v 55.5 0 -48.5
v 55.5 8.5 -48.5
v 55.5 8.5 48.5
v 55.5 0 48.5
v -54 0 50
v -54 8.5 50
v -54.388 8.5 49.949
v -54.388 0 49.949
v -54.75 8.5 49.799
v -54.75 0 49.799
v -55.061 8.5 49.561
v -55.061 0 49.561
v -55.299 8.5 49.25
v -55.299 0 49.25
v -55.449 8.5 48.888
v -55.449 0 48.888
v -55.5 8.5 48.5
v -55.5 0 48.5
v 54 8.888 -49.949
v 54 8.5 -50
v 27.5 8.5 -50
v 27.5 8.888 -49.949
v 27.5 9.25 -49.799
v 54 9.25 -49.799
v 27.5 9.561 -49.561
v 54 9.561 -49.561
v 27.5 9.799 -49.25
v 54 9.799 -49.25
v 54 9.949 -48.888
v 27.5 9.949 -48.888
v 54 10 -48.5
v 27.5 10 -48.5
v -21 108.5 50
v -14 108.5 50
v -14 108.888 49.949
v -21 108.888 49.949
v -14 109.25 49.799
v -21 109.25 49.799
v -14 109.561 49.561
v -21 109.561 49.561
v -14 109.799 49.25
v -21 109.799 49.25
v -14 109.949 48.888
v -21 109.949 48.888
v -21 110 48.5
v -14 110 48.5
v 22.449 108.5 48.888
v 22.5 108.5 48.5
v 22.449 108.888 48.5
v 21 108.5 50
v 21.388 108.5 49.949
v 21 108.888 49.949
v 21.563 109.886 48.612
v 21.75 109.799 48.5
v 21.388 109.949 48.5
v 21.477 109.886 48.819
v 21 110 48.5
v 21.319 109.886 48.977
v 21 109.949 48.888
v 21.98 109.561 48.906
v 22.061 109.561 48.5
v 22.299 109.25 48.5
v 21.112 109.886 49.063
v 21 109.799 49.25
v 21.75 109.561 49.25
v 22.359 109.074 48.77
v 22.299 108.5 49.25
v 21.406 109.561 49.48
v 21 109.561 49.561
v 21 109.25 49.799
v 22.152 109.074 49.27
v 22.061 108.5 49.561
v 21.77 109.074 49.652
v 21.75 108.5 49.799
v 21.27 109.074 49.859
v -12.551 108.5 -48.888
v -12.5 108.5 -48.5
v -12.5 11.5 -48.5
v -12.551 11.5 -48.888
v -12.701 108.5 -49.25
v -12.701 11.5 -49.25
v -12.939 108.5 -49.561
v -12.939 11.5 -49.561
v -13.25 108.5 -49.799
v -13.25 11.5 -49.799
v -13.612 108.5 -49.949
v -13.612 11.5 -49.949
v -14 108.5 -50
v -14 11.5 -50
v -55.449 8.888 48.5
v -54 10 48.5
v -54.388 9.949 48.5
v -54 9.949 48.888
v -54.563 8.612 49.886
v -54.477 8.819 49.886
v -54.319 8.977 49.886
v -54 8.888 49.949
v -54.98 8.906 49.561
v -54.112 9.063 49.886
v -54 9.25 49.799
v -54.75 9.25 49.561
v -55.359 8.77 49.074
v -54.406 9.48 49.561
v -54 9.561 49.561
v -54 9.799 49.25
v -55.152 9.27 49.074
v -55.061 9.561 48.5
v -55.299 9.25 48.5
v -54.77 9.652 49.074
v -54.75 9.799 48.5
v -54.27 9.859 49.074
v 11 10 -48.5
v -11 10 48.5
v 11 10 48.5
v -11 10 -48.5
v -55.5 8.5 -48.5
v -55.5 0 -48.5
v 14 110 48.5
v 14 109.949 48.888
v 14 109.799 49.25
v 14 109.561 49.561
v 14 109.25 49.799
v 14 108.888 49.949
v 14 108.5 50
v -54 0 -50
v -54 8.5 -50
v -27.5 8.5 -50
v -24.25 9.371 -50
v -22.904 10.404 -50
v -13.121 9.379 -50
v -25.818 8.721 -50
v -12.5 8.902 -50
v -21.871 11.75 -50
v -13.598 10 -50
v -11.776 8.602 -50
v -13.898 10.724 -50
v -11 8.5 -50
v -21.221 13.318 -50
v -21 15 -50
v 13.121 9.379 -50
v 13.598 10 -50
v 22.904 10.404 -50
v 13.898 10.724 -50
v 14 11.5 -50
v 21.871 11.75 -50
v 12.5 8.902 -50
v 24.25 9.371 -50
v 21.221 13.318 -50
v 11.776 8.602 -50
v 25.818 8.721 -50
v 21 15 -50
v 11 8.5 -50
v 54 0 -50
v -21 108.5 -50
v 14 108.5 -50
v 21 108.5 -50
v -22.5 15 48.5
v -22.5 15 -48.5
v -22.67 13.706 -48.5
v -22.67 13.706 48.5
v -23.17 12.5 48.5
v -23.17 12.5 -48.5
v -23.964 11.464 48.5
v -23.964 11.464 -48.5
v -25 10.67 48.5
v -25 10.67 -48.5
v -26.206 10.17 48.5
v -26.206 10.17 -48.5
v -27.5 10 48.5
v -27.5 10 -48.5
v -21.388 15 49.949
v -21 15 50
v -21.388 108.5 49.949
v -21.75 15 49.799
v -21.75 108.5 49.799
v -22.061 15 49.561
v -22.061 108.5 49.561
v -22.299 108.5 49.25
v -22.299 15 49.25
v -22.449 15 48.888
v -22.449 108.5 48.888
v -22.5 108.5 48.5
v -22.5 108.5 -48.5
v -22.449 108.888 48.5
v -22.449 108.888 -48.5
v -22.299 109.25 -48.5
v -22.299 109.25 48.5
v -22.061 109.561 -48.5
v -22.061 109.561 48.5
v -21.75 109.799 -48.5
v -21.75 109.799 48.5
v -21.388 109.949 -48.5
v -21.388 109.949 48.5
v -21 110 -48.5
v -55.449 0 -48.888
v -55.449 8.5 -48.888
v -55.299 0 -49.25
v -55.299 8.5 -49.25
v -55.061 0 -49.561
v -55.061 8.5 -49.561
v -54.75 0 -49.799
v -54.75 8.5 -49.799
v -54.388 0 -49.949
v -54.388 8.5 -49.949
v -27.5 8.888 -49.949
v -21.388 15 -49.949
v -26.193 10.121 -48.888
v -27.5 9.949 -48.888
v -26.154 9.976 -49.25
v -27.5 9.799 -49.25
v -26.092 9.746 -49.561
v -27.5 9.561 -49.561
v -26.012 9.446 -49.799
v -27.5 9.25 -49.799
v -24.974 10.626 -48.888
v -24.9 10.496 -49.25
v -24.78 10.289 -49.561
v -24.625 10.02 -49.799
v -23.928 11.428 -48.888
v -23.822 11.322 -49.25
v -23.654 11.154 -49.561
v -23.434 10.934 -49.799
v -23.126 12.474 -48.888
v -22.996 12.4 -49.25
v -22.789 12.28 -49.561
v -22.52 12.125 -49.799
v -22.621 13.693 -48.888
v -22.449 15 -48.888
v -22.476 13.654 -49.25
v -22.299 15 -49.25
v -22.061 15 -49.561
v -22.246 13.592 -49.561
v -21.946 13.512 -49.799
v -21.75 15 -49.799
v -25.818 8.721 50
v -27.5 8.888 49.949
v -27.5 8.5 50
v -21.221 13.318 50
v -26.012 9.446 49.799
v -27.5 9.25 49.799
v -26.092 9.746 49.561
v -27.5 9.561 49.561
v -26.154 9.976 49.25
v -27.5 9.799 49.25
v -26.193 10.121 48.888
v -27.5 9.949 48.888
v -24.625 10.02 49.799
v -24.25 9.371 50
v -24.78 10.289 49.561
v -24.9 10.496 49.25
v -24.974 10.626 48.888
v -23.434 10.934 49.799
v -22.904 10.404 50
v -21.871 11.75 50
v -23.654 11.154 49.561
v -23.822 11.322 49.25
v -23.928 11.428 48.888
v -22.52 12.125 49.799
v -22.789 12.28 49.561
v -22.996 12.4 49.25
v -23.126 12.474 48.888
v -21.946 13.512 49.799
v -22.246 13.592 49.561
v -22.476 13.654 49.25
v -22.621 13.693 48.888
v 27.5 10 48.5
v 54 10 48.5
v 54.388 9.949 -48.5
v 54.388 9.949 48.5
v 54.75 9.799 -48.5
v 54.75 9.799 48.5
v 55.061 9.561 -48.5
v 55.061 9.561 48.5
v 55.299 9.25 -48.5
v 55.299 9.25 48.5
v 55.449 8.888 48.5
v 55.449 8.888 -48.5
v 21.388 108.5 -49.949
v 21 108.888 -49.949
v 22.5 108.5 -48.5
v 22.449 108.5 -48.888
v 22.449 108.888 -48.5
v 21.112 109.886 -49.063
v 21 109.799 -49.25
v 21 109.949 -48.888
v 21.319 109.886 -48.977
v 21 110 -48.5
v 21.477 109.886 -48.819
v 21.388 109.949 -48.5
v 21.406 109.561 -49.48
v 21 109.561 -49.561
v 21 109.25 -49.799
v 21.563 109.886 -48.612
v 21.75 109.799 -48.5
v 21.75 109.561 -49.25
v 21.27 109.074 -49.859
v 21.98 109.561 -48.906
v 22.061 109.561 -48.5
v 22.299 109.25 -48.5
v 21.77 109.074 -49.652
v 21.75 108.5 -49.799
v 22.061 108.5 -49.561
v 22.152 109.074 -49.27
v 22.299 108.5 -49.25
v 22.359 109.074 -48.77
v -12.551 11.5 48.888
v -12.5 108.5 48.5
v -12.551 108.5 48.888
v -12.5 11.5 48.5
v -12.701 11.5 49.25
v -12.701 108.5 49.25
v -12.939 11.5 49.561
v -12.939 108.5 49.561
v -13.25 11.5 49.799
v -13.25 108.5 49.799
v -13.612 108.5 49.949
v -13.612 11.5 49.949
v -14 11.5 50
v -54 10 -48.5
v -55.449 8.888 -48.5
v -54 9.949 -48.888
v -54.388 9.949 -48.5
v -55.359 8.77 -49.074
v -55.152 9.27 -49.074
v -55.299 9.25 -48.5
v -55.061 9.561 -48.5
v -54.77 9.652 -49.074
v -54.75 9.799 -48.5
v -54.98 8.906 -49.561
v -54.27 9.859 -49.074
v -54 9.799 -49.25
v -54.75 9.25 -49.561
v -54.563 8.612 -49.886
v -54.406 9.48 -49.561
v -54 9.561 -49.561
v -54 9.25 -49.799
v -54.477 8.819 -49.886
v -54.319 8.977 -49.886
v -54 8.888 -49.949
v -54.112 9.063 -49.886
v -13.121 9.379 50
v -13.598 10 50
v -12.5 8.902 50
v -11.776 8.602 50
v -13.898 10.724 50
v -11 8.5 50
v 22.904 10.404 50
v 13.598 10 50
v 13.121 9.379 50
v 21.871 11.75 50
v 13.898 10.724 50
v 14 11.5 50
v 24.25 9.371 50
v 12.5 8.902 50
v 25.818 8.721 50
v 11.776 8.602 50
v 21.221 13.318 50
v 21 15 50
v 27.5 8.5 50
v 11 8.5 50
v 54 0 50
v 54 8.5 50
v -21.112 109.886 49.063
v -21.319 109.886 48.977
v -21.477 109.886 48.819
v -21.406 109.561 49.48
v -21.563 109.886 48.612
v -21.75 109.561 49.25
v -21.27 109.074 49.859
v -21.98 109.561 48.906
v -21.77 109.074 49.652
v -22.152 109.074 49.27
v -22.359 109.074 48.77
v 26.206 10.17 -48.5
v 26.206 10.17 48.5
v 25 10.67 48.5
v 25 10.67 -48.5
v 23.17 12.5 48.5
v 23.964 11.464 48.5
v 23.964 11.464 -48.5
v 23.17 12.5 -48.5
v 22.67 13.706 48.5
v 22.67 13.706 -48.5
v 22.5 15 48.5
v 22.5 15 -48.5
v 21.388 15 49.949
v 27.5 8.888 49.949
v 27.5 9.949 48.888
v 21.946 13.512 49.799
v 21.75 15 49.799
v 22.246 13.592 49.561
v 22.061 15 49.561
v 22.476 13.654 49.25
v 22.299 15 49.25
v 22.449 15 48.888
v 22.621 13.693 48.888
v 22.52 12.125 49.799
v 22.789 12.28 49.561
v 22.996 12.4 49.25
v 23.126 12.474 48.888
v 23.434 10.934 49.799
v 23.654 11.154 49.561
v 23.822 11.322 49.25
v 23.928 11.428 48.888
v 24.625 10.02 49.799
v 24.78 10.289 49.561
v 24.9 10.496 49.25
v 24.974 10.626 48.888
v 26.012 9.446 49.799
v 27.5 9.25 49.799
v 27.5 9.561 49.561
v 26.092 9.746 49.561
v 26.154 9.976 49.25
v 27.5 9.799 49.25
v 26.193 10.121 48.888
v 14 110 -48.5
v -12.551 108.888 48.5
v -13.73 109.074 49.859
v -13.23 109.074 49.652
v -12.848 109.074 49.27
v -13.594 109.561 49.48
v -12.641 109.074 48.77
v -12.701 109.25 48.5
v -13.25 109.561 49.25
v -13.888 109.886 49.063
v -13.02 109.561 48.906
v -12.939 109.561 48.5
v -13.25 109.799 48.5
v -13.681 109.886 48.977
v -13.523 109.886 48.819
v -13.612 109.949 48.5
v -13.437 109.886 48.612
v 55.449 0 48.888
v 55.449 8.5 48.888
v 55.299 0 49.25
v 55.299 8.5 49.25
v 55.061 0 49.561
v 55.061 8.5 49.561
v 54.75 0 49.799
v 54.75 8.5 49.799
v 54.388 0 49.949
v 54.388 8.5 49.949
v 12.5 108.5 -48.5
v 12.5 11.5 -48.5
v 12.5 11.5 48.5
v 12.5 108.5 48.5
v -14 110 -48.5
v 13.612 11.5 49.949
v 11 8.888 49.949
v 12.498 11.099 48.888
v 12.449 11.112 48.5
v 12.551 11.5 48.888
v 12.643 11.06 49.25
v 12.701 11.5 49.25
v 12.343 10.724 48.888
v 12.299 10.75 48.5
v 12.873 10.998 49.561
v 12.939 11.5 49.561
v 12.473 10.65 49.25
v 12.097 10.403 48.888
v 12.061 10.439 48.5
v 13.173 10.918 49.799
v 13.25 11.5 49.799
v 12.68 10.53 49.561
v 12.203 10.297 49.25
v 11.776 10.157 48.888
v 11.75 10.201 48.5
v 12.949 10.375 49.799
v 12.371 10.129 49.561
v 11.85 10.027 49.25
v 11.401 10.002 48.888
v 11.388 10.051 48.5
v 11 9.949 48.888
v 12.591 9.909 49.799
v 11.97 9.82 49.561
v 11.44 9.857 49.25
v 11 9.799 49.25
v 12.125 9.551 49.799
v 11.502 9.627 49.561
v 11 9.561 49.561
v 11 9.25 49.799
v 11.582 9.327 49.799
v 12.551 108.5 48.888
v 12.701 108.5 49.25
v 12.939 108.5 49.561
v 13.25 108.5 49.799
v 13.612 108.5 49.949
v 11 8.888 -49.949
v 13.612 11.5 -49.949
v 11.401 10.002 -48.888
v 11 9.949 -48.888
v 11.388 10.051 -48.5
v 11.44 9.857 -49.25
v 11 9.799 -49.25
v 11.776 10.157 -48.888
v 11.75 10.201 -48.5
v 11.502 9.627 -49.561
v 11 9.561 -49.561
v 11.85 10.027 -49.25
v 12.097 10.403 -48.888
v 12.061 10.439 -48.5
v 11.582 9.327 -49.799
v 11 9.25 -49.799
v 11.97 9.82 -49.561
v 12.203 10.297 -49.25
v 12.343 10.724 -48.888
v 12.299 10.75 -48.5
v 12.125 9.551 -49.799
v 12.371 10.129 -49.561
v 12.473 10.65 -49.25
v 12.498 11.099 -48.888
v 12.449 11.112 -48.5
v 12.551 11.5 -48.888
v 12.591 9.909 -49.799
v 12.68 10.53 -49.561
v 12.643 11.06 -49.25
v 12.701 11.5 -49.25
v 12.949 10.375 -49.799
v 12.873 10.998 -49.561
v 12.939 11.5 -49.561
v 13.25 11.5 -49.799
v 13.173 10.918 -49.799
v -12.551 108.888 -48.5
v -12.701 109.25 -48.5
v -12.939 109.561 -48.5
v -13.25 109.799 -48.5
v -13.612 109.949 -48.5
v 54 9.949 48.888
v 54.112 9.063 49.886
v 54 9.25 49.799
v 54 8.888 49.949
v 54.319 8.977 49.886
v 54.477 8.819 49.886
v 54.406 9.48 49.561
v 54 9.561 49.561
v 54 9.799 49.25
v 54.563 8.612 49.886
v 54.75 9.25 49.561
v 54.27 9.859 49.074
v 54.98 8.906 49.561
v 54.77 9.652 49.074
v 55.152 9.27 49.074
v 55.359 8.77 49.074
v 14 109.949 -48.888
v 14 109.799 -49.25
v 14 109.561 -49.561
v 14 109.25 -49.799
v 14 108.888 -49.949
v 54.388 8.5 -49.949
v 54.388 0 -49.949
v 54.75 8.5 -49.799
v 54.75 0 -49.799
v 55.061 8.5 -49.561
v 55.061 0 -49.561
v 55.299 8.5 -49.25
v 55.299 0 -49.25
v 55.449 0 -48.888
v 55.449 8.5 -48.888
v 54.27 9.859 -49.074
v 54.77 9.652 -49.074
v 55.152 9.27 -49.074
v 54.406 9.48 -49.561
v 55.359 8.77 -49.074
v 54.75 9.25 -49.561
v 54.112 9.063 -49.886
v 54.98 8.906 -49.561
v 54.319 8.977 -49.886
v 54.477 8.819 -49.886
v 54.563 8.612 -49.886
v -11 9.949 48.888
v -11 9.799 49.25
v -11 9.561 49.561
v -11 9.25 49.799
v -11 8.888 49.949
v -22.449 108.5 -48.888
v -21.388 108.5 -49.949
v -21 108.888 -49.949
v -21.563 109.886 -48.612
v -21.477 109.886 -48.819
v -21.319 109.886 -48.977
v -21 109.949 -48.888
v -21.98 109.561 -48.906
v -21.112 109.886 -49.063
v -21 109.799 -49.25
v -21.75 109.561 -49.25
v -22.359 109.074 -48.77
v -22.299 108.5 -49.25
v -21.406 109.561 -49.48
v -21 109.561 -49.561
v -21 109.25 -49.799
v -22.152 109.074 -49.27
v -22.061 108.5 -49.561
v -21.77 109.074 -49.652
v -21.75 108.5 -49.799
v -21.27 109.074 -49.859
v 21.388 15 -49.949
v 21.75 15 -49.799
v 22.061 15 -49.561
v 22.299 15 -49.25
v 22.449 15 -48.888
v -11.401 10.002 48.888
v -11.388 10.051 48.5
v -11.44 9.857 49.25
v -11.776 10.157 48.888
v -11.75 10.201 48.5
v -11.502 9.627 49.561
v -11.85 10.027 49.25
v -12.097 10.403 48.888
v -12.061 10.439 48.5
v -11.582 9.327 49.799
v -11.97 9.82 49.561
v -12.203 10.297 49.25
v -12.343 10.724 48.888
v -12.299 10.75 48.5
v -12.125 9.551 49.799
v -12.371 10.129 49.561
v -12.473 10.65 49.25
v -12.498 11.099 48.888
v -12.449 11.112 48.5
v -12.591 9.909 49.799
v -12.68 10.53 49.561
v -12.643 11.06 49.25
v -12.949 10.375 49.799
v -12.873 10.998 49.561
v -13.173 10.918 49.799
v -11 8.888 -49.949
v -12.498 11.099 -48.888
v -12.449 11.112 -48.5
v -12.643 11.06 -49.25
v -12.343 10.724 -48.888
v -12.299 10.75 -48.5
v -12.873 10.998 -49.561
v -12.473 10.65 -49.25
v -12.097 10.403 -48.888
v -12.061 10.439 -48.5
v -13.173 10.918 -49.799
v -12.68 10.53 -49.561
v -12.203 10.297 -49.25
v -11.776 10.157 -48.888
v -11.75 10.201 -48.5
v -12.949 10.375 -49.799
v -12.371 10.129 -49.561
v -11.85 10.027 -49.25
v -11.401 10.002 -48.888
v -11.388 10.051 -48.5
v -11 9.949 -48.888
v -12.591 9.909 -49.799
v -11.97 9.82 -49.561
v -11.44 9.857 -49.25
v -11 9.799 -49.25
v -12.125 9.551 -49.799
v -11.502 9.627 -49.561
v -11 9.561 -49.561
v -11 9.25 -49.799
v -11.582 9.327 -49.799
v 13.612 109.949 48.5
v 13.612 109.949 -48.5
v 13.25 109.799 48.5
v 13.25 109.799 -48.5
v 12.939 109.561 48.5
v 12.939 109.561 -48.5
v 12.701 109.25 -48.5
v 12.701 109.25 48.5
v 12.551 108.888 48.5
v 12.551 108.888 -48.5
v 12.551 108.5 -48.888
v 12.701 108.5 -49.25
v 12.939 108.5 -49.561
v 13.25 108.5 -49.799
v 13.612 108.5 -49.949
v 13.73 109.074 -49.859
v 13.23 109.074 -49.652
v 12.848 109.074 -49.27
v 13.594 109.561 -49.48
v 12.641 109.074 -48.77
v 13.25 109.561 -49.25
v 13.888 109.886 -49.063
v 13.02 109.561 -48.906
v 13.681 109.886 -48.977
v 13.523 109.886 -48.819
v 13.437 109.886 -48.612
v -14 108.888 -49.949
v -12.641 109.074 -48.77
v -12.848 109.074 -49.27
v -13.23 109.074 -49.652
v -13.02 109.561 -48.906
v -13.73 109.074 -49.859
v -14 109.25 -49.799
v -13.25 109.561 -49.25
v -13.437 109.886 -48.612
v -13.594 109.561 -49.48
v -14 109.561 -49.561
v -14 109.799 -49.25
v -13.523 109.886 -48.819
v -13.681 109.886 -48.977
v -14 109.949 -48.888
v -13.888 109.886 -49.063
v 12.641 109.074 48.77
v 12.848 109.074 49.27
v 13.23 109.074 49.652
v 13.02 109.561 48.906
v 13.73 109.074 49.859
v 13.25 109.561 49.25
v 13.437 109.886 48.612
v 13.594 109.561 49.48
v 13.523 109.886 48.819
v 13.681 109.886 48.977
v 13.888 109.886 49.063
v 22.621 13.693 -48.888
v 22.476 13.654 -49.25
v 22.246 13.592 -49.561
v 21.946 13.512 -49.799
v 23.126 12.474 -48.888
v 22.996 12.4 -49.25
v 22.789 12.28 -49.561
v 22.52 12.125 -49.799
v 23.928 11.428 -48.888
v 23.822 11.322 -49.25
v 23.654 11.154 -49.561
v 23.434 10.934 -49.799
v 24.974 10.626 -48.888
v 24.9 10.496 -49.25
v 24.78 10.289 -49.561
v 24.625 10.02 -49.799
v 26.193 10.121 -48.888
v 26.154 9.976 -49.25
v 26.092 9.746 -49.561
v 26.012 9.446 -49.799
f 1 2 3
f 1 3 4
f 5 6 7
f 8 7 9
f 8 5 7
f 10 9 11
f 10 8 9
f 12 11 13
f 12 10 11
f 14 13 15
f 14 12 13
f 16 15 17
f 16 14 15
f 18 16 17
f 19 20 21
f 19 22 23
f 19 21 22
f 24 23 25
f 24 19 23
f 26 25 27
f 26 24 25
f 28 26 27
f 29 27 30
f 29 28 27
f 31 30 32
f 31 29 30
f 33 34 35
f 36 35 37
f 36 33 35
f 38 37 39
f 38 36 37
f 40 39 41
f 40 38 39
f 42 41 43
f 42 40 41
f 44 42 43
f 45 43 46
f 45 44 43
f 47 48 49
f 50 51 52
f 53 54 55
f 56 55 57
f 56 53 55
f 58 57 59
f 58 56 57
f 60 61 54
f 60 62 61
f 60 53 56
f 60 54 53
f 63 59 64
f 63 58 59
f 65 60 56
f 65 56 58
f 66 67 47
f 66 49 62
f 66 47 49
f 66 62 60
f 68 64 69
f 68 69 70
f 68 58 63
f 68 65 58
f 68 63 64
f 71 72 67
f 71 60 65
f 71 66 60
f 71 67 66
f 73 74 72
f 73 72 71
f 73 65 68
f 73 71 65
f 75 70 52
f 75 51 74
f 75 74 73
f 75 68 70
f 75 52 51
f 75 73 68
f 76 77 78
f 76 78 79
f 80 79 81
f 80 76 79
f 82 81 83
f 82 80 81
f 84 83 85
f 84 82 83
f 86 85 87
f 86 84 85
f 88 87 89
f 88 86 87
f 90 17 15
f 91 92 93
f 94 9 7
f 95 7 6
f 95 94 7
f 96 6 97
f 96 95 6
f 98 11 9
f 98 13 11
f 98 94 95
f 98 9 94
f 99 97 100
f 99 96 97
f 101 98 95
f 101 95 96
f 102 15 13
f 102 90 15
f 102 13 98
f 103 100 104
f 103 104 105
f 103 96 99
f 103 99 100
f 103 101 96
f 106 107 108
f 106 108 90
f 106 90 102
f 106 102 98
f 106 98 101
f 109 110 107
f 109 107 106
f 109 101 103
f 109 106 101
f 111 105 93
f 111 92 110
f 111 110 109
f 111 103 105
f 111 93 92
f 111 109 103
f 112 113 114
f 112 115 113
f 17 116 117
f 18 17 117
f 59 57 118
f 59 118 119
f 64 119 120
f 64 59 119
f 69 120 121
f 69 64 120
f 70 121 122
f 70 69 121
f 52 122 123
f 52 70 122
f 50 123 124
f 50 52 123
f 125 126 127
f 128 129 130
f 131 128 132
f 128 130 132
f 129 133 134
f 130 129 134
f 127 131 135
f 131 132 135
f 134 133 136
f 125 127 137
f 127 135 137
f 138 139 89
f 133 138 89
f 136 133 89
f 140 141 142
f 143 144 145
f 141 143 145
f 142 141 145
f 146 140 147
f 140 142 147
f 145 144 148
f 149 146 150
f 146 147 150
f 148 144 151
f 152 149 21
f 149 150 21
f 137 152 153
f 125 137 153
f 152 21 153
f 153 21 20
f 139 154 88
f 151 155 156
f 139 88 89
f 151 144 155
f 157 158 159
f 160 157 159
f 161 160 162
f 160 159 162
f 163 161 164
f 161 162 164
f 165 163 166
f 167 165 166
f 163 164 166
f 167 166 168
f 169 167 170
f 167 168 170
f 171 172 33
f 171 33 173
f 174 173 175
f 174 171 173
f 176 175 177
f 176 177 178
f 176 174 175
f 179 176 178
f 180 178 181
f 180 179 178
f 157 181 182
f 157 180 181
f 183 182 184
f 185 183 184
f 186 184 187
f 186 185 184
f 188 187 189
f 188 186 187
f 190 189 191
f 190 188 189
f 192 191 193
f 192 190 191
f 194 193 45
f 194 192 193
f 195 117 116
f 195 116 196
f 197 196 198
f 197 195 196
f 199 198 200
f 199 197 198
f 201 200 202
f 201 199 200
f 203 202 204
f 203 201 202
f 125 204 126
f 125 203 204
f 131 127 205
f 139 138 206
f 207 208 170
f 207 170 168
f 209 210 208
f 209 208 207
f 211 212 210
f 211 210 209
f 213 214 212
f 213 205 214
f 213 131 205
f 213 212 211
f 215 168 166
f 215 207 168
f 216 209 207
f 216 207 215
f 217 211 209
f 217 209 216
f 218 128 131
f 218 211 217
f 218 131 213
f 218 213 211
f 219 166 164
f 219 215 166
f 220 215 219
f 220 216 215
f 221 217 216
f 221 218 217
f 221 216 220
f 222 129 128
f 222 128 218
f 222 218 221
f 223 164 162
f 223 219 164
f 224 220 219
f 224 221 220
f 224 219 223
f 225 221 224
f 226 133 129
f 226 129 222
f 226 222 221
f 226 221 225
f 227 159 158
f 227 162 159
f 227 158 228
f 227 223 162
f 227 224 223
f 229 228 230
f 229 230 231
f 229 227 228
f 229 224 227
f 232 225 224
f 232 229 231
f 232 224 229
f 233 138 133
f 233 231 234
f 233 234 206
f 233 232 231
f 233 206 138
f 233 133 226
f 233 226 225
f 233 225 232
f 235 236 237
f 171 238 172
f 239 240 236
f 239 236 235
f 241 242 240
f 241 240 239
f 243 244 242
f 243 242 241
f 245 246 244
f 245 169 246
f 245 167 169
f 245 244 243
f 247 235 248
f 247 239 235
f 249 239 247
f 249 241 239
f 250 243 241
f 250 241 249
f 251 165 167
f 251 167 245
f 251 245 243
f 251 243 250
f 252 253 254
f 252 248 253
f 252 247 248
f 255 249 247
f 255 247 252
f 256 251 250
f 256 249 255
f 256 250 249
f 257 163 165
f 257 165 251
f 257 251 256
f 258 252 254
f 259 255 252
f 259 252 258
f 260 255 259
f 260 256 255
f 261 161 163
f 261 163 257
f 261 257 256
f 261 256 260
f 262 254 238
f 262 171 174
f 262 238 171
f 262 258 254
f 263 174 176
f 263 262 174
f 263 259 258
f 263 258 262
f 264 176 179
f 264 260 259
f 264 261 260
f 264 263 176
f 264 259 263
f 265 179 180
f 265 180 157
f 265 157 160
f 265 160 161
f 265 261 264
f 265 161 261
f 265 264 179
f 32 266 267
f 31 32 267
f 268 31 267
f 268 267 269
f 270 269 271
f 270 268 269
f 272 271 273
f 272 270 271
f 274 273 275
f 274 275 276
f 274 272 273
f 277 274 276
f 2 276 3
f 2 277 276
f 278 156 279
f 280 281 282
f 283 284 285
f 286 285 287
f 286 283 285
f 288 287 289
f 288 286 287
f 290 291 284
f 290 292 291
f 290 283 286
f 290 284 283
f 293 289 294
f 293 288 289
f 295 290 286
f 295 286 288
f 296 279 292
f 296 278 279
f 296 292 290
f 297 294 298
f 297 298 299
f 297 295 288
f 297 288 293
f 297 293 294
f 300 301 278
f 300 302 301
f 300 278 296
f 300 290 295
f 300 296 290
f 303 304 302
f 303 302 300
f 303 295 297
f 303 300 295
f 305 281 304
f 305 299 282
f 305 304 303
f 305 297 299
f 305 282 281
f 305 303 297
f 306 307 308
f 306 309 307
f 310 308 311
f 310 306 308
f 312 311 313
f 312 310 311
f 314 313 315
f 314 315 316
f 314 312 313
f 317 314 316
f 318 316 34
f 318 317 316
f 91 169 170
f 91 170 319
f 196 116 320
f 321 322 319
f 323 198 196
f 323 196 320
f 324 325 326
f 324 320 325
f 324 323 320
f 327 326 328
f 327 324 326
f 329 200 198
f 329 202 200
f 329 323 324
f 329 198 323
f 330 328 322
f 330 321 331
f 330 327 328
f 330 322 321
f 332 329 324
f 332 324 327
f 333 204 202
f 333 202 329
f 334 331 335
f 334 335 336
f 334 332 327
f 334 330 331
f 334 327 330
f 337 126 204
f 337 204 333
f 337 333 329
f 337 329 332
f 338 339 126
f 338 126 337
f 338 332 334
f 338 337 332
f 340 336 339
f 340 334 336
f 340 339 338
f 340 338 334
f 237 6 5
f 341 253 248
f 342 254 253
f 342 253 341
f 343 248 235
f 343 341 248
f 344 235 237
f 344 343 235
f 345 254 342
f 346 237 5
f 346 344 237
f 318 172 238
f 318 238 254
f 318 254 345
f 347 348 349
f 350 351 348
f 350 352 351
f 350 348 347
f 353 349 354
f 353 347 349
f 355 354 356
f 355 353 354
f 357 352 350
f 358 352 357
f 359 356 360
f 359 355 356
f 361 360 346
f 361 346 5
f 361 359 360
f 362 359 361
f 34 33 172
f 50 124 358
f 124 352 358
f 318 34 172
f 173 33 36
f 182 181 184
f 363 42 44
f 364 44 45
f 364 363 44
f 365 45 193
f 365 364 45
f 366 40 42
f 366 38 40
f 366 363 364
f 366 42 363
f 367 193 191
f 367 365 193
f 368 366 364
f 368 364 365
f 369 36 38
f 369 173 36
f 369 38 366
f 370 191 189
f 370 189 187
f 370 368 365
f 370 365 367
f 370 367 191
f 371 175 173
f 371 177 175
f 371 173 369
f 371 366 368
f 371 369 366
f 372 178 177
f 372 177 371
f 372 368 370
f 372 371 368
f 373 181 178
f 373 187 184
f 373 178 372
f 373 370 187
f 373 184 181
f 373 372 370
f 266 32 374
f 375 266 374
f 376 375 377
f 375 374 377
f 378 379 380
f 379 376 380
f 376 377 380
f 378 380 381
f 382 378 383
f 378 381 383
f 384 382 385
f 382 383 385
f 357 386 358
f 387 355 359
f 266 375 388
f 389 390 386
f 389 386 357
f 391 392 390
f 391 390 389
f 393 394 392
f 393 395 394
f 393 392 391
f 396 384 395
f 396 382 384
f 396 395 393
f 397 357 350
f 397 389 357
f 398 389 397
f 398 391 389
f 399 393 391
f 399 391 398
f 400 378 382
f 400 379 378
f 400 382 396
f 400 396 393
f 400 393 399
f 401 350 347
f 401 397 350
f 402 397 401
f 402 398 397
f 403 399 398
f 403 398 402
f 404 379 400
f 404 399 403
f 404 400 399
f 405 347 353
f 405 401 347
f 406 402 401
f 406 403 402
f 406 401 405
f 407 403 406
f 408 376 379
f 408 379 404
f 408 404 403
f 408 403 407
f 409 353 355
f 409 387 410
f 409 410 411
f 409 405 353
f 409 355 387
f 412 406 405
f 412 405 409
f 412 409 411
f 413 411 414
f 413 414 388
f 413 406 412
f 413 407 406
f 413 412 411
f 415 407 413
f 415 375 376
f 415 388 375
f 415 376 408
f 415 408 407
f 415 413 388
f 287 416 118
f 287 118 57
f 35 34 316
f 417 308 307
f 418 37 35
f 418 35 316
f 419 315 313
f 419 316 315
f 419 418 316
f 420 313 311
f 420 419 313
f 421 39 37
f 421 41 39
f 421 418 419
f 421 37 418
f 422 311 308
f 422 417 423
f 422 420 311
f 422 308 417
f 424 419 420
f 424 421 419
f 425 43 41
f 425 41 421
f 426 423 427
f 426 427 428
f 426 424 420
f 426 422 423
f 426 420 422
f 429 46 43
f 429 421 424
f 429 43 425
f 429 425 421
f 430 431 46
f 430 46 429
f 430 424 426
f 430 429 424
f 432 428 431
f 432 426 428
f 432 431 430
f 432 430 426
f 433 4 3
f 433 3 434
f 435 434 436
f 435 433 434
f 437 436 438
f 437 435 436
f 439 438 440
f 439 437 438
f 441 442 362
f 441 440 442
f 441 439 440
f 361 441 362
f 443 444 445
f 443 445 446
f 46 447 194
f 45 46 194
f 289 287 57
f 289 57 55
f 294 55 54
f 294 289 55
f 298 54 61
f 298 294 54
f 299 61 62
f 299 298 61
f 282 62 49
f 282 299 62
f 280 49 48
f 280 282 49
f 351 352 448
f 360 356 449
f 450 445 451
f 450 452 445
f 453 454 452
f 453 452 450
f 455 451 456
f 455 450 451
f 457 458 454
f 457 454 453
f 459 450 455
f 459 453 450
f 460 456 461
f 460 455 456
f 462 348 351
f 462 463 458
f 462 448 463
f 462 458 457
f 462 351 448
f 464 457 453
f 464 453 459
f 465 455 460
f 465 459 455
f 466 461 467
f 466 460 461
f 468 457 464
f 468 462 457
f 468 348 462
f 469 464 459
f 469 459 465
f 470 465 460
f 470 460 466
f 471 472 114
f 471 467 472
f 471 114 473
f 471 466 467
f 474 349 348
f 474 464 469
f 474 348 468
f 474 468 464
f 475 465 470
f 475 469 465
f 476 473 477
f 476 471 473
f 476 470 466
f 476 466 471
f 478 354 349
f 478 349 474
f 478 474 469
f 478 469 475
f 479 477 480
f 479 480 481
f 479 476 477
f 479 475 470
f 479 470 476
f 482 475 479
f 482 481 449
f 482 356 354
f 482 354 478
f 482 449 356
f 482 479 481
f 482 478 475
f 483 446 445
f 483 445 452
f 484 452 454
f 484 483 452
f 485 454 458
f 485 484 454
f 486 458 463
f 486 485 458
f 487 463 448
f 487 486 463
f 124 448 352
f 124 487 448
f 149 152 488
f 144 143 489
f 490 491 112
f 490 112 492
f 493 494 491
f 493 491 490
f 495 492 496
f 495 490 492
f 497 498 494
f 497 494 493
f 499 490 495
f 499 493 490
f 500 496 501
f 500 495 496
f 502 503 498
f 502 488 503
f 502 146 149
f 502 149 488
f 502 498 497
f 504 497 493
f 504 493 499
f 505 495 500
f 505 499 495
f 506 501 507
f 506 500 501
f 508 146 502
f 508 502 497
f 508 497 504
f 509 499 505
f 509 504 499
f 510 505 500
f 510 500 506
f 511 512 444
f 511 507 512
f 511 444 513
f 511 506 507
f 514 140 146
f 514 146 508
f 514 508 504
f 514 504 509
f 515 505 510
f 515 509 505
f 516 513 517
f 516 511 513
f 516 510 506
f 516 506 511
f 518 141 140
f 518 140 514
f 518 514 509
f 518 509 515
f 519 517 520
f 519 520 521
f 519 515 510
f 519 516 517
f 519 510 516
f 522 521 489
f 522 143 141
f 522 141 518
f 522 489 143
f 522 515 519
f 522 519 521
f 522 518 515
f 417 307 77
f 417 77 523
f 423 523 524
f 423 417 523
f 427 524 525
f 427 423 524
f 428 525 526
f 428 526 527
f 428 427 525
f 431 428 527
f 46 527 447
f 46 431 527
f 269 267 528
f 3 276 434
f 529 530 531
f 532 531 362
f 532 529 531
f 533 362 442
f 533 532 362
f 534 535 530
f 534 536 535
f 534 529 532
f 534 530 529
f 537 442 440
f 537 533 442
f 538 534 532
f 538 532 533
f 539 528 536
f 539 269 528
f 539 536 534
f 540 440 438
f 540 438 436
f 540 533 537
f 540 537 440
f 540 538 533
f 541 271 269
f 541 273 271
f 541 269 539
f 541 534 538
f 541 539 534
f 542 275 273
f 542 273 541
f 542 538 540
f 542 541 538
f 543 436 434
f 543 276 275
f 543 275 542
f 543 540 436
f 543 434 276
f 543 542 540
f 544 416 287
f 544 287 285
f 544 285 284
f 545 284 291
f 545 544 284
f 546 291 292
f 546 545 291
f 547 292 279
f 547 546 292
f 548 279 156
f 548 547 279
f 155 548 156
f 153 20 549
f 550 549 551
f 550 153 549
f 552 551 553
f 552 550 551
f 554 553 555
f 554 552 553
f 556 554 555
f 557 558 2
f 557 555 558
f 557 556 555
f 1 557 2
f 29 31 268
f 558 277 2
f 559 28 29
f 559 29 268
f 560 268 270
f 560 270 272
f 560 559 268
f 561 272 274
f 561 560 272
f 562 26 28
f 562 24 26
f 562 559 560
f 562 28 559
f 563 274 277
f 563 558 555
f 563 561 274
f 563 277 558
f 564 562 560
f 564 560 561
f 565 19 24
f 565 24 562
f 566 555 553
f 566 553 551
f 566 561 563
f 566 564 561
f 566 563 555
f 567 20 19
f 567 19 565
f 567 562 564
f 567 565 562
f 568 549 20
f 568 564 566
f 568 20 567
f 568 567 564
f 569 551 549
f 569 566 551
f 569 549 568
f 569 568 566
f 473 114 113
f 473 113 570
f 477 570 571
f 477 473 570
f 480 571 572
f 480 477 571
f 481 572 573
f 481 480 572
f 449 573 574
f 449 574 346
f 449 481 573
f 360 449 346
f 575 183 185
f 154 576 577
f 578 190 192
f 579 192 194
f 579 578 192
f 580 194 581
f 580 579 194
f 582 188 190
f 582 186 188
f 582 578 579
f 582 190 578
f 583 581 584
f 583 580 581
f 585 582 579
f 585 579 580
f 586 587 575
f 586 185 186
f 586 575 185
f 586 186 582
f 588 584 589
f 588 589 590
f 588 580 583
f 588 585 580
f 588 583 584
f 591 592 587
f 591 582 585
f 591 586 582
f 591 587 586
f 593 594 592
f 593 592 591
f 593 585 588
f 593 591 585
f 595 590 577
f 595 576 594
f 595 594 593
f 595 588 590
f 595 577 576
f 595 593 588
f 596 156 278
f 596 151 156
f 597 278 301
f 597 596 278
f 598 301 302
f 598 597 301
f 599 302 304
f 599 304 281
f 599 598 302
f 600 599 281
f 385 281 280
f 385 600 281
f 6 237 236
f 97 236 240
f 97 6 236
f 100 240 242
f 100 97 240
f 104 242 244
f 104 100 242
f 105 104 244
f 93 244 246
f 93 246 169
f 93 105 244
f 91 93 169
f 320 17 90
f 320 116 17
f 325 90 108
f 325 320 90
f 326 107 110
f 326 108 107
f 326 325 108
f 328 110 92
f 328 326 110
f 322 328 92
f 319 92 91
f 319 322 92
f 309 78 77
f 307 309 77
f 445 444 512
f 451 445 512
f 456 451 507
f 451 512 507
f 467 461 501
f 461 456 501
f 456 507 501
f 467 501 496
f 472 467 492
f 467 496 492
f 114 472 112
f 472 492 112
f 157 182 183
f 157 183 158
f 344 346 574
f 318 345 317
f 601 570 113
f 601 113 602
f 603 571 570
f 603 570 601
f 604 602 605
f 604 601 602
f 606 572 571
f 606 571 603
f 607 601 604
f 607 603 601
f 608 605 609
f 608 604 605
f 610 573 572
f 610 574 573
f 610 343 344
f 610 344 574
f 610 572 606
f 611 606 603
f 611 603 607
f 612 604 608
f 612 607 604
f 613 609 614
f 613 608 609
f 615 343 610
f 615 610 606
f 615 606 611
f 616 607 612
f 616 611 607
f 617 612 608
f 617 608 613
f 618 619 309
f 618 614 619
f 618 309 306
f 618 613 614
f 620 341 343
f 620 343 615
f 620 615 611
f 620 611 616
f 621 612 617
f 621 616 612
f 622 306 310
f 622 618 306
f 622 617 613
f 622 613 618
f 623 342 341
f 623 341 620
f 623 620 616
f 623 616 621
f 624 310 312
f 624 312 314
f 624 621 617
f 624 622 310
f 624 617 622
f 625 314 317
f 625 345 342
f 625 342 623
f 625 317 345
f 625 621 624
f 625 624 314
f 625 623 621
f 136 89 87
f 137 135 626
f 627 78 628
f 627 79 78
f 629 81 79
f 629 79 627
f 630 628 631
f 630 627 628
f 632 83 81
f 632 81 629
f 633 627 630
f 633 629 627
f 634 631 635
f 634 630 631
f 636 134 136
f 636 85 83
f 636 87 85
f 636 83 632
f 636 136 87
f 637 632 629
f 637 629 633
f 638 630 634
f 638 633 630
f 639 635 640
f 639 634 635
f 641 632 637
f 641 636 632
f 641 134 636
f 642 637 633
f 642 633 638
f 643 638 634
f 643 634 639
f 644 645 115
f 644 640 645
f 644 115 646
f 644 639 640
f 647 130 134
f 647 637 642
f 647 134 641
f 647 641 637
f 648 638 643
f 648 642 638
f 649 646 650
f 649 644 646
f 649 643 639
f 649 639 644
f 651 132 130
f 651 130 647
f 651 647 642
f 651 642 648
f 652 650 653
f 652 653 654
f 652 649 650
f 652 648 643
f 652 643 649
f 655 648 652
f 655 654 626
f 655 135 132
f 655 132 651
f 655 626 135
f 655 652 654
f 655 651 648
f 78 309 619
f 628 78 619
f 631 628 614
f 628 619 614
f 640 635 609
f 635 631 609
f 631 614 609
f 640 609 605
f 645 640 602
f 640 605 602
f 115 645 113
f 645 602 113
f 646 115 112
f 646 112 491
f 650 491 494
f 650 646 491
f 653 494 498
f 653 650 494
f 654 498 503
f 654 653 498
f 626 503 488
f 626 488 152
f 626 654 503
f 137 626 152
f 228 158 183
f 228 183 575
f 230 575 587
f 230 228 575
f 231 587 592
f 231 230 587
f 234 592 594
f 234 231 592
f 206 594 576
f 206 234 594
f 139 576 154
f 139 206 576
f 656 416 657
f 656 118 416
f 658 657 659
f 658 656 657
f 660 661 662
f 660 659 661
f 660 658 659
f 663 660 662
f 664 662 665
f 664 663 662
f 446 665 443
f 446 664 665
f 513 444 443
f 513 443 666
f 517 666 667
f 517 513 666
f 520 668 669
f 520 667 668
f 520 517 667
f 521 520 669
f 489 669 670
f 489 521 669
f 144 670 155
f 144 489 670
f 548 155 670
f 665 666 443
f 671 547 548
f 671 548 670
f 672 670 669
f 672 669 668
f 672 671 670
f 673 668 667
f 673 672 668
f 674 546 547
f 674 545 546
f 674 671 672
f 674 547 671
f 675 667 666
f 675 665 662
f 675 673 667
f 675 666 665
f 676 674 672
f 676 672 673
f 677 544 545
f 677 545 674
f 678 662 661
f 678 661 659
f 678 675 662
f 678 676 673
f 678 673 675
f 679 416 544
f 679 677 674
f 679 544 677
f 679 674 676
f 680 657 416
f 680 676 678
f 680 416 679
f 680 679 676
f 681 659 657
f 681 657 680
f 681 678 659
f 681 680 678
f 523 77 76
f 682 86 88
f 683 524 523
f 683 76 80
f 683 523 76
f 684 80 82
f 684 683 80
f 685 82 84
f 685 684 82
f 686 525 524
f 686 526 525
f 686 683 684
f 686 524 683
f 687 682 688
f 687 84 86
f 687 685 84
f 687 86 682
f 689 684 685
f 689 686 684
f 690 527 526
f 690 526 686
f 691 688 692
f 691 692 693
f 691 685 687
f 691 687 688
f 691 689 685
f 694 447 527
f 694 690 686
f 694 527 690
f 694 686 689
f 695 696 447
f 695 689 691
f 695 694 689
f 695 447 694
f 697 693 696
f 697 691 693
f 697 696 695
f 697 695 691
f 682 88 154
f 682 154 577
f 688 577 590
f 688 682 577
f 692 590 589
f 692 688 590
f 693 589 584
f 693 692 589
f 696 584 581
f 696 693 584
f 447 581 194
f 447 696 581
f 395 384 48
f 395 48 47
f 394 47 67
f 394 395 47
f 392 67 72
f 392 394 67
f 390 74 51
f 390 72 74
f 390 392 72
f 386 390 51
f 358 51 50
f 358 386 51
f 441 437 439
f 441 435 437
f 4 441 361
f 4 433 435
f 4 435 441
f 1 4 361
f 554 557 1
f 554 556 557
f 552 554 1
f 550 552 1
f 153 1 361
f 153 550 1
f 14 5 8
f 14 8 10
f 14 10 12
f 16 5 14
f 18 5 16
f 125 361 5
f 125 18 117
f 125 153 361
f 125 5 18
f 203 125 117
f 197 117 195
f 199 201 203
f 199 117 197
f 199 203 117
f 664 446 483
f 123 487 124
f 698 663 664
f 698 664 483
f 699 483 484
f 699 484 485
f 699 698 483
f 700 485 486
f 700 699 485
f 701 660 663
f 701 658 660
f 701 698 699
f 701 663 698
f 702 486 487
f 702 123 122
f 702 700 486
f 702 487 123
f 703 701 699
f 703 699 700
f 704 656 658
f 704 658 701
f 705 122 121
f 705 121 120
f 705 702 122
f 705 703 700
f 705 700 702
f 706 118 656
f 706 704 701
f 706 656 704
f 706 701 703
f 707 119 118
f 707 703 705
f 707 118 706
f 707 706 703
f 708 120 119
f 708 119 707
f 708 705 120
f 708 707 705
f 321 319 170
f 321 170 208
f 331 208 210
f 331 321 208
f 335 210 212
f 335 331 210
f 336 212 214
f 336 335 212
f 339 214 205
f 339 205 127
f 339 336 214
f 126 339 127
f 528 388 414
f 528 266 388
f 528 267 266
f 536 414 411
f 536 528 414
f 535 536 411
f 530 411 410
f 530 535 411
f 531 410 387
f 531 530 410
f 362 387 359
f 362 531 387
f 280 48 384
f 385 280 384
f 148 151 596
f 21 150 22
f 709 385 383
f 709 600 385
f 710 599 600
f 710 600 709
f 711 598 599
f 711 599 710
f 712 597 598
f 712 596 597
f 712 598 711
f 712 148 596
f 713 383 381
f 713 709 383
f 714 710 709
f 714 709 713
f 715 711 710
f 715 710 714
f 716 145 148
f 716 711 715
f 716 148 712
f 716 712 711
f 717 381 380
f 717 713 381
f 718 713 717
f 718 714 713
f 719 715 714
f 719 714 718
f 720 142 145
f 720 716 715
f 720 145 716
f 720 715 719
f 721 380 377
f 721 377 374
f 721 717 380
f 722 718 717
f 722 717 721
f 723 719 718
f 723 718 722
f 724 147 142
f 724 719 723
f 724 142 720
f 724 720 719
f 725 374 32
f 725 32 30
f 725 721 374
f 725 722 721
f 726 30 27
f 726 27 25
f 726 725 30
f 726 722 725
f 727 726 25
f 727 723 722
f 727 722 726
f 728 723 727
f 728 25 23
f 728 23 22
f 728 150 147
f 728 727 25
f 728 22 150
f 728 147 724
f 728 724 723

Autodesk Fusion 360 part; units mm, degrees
sketch "Esquisse1" plane through (0, 0, 0) normal (0, 0, 1) x (1, 0, 0)
  line L0 (0, 10) -> (-12.5, 10)
  line L1 (-12.5, 10) -> (-12.5, 110)
  line L2 (-12.5, 110) -> (-22.5, 110)
  line L3 (-22.5, 110) -> (-22.5, 10)
  line L4 (-22.5, 10) -> (-55.5, 10)
  line L5 (-55.5, 10) -> (-55.5, 0)
  line L6 (-55.5, 0) -> (0, 0)
  line L7 (0, 1.75) -> (0, 22.5)
  line L8 (1.75, 0) -> (22.5, 0)
  line L9 (0, 10) -> (12.5, 10)
  line L10 (12.5, 10) -> (12.5, 110)
  line L11 (12.5, 110) -> (22.5, 110)
  line L12 (22.5, 110) -> (22.5, 10)
  line L13 (22.5, 10) -> (55.5, 10)
  line L14 (55.5, 10) -> (55.5, 0)
  line L15 (55.5, 0) -> (0, 0)
  dimension "d13" = 12.5
  dimension "d15" = 10
  dimension "d16" = 10
  dimension "d17" = 100
  dimension "d19" = 10
  dimension "d20" = 55.5
extrude "Extrusion1" add sketch "Esquisse1" along normal mid plane 100
fillet "Congé5" radius 1.5 1 edges at (55.5, 10, 0)
fillet "Congé5" radius 1.5 1 edges at (-55.5, 10, 0)
fillet "Congé5" radius 1.5 1 edges at (12.5, 10, 0)
fillet "Congé5" radius 1.5 1 edges at (-12.5, 10, 0)
fillet "Congé5" radius 1.5 1 edges at (0, 10, -50)
fillet "Congé5" radius 1.5 1 edges at (0, 10, 50)
fillet "Congé6" radius 5 1 edges at (22.5, 10, 0)
fillet "Congé6" radius 5 1 edges at (-22.5, 10, 0)
fillet "Congé7" radius 1.5 5 edges at (-22.5, 62.5, 50) (-23.9645, 11.4645, 50) (-40.75, 10, 50) (-55.0607, 9.5607, 50) (-55.5, 4.25, 50)
fillet "Congé7" radius 1.5 5 edges at (22.5, 62.5, 50) (23.9645, 11.4645, 50) (40.75, 10, 50) (55.0607, 9.5607, 50) (55.5, 4.25, 50)
fillet "Congé7" radius 1.5 5 edges at (-55.5, 4.25, -50) (-55.0607, 9.5607, -50) (-40.75, 10, -50) (-23.9645, 11.4645, -50) (-22.5, 62.5, -50)
fillet "Congé7" radius 1.5 5 edges at (22.5, 62.5, -50) (23.9645, 11.4645, -50) (40.75, 10, -50) (55.0607, 9.5607, -50) (55.5, 4.25, -50)
fillet "Congé7" radius 1.5 1 edges at (17.5, 110, 50)
fillet "Congé7" radius 1.5 1 edges at (-17.5, 110, 50)
fillet "Congé7" radius 1.5 1 edges at (-17.5, 110, -50)
fillet "Congé7" radius 1.5 1 edges at (17.5, 110, -50)
fillet "Congé7" radius 1.5 4 edges at (22.5, 110, 0) (12.5, 110, 0) (-12.5, 110, 0) (-22.5, 110, 0)
